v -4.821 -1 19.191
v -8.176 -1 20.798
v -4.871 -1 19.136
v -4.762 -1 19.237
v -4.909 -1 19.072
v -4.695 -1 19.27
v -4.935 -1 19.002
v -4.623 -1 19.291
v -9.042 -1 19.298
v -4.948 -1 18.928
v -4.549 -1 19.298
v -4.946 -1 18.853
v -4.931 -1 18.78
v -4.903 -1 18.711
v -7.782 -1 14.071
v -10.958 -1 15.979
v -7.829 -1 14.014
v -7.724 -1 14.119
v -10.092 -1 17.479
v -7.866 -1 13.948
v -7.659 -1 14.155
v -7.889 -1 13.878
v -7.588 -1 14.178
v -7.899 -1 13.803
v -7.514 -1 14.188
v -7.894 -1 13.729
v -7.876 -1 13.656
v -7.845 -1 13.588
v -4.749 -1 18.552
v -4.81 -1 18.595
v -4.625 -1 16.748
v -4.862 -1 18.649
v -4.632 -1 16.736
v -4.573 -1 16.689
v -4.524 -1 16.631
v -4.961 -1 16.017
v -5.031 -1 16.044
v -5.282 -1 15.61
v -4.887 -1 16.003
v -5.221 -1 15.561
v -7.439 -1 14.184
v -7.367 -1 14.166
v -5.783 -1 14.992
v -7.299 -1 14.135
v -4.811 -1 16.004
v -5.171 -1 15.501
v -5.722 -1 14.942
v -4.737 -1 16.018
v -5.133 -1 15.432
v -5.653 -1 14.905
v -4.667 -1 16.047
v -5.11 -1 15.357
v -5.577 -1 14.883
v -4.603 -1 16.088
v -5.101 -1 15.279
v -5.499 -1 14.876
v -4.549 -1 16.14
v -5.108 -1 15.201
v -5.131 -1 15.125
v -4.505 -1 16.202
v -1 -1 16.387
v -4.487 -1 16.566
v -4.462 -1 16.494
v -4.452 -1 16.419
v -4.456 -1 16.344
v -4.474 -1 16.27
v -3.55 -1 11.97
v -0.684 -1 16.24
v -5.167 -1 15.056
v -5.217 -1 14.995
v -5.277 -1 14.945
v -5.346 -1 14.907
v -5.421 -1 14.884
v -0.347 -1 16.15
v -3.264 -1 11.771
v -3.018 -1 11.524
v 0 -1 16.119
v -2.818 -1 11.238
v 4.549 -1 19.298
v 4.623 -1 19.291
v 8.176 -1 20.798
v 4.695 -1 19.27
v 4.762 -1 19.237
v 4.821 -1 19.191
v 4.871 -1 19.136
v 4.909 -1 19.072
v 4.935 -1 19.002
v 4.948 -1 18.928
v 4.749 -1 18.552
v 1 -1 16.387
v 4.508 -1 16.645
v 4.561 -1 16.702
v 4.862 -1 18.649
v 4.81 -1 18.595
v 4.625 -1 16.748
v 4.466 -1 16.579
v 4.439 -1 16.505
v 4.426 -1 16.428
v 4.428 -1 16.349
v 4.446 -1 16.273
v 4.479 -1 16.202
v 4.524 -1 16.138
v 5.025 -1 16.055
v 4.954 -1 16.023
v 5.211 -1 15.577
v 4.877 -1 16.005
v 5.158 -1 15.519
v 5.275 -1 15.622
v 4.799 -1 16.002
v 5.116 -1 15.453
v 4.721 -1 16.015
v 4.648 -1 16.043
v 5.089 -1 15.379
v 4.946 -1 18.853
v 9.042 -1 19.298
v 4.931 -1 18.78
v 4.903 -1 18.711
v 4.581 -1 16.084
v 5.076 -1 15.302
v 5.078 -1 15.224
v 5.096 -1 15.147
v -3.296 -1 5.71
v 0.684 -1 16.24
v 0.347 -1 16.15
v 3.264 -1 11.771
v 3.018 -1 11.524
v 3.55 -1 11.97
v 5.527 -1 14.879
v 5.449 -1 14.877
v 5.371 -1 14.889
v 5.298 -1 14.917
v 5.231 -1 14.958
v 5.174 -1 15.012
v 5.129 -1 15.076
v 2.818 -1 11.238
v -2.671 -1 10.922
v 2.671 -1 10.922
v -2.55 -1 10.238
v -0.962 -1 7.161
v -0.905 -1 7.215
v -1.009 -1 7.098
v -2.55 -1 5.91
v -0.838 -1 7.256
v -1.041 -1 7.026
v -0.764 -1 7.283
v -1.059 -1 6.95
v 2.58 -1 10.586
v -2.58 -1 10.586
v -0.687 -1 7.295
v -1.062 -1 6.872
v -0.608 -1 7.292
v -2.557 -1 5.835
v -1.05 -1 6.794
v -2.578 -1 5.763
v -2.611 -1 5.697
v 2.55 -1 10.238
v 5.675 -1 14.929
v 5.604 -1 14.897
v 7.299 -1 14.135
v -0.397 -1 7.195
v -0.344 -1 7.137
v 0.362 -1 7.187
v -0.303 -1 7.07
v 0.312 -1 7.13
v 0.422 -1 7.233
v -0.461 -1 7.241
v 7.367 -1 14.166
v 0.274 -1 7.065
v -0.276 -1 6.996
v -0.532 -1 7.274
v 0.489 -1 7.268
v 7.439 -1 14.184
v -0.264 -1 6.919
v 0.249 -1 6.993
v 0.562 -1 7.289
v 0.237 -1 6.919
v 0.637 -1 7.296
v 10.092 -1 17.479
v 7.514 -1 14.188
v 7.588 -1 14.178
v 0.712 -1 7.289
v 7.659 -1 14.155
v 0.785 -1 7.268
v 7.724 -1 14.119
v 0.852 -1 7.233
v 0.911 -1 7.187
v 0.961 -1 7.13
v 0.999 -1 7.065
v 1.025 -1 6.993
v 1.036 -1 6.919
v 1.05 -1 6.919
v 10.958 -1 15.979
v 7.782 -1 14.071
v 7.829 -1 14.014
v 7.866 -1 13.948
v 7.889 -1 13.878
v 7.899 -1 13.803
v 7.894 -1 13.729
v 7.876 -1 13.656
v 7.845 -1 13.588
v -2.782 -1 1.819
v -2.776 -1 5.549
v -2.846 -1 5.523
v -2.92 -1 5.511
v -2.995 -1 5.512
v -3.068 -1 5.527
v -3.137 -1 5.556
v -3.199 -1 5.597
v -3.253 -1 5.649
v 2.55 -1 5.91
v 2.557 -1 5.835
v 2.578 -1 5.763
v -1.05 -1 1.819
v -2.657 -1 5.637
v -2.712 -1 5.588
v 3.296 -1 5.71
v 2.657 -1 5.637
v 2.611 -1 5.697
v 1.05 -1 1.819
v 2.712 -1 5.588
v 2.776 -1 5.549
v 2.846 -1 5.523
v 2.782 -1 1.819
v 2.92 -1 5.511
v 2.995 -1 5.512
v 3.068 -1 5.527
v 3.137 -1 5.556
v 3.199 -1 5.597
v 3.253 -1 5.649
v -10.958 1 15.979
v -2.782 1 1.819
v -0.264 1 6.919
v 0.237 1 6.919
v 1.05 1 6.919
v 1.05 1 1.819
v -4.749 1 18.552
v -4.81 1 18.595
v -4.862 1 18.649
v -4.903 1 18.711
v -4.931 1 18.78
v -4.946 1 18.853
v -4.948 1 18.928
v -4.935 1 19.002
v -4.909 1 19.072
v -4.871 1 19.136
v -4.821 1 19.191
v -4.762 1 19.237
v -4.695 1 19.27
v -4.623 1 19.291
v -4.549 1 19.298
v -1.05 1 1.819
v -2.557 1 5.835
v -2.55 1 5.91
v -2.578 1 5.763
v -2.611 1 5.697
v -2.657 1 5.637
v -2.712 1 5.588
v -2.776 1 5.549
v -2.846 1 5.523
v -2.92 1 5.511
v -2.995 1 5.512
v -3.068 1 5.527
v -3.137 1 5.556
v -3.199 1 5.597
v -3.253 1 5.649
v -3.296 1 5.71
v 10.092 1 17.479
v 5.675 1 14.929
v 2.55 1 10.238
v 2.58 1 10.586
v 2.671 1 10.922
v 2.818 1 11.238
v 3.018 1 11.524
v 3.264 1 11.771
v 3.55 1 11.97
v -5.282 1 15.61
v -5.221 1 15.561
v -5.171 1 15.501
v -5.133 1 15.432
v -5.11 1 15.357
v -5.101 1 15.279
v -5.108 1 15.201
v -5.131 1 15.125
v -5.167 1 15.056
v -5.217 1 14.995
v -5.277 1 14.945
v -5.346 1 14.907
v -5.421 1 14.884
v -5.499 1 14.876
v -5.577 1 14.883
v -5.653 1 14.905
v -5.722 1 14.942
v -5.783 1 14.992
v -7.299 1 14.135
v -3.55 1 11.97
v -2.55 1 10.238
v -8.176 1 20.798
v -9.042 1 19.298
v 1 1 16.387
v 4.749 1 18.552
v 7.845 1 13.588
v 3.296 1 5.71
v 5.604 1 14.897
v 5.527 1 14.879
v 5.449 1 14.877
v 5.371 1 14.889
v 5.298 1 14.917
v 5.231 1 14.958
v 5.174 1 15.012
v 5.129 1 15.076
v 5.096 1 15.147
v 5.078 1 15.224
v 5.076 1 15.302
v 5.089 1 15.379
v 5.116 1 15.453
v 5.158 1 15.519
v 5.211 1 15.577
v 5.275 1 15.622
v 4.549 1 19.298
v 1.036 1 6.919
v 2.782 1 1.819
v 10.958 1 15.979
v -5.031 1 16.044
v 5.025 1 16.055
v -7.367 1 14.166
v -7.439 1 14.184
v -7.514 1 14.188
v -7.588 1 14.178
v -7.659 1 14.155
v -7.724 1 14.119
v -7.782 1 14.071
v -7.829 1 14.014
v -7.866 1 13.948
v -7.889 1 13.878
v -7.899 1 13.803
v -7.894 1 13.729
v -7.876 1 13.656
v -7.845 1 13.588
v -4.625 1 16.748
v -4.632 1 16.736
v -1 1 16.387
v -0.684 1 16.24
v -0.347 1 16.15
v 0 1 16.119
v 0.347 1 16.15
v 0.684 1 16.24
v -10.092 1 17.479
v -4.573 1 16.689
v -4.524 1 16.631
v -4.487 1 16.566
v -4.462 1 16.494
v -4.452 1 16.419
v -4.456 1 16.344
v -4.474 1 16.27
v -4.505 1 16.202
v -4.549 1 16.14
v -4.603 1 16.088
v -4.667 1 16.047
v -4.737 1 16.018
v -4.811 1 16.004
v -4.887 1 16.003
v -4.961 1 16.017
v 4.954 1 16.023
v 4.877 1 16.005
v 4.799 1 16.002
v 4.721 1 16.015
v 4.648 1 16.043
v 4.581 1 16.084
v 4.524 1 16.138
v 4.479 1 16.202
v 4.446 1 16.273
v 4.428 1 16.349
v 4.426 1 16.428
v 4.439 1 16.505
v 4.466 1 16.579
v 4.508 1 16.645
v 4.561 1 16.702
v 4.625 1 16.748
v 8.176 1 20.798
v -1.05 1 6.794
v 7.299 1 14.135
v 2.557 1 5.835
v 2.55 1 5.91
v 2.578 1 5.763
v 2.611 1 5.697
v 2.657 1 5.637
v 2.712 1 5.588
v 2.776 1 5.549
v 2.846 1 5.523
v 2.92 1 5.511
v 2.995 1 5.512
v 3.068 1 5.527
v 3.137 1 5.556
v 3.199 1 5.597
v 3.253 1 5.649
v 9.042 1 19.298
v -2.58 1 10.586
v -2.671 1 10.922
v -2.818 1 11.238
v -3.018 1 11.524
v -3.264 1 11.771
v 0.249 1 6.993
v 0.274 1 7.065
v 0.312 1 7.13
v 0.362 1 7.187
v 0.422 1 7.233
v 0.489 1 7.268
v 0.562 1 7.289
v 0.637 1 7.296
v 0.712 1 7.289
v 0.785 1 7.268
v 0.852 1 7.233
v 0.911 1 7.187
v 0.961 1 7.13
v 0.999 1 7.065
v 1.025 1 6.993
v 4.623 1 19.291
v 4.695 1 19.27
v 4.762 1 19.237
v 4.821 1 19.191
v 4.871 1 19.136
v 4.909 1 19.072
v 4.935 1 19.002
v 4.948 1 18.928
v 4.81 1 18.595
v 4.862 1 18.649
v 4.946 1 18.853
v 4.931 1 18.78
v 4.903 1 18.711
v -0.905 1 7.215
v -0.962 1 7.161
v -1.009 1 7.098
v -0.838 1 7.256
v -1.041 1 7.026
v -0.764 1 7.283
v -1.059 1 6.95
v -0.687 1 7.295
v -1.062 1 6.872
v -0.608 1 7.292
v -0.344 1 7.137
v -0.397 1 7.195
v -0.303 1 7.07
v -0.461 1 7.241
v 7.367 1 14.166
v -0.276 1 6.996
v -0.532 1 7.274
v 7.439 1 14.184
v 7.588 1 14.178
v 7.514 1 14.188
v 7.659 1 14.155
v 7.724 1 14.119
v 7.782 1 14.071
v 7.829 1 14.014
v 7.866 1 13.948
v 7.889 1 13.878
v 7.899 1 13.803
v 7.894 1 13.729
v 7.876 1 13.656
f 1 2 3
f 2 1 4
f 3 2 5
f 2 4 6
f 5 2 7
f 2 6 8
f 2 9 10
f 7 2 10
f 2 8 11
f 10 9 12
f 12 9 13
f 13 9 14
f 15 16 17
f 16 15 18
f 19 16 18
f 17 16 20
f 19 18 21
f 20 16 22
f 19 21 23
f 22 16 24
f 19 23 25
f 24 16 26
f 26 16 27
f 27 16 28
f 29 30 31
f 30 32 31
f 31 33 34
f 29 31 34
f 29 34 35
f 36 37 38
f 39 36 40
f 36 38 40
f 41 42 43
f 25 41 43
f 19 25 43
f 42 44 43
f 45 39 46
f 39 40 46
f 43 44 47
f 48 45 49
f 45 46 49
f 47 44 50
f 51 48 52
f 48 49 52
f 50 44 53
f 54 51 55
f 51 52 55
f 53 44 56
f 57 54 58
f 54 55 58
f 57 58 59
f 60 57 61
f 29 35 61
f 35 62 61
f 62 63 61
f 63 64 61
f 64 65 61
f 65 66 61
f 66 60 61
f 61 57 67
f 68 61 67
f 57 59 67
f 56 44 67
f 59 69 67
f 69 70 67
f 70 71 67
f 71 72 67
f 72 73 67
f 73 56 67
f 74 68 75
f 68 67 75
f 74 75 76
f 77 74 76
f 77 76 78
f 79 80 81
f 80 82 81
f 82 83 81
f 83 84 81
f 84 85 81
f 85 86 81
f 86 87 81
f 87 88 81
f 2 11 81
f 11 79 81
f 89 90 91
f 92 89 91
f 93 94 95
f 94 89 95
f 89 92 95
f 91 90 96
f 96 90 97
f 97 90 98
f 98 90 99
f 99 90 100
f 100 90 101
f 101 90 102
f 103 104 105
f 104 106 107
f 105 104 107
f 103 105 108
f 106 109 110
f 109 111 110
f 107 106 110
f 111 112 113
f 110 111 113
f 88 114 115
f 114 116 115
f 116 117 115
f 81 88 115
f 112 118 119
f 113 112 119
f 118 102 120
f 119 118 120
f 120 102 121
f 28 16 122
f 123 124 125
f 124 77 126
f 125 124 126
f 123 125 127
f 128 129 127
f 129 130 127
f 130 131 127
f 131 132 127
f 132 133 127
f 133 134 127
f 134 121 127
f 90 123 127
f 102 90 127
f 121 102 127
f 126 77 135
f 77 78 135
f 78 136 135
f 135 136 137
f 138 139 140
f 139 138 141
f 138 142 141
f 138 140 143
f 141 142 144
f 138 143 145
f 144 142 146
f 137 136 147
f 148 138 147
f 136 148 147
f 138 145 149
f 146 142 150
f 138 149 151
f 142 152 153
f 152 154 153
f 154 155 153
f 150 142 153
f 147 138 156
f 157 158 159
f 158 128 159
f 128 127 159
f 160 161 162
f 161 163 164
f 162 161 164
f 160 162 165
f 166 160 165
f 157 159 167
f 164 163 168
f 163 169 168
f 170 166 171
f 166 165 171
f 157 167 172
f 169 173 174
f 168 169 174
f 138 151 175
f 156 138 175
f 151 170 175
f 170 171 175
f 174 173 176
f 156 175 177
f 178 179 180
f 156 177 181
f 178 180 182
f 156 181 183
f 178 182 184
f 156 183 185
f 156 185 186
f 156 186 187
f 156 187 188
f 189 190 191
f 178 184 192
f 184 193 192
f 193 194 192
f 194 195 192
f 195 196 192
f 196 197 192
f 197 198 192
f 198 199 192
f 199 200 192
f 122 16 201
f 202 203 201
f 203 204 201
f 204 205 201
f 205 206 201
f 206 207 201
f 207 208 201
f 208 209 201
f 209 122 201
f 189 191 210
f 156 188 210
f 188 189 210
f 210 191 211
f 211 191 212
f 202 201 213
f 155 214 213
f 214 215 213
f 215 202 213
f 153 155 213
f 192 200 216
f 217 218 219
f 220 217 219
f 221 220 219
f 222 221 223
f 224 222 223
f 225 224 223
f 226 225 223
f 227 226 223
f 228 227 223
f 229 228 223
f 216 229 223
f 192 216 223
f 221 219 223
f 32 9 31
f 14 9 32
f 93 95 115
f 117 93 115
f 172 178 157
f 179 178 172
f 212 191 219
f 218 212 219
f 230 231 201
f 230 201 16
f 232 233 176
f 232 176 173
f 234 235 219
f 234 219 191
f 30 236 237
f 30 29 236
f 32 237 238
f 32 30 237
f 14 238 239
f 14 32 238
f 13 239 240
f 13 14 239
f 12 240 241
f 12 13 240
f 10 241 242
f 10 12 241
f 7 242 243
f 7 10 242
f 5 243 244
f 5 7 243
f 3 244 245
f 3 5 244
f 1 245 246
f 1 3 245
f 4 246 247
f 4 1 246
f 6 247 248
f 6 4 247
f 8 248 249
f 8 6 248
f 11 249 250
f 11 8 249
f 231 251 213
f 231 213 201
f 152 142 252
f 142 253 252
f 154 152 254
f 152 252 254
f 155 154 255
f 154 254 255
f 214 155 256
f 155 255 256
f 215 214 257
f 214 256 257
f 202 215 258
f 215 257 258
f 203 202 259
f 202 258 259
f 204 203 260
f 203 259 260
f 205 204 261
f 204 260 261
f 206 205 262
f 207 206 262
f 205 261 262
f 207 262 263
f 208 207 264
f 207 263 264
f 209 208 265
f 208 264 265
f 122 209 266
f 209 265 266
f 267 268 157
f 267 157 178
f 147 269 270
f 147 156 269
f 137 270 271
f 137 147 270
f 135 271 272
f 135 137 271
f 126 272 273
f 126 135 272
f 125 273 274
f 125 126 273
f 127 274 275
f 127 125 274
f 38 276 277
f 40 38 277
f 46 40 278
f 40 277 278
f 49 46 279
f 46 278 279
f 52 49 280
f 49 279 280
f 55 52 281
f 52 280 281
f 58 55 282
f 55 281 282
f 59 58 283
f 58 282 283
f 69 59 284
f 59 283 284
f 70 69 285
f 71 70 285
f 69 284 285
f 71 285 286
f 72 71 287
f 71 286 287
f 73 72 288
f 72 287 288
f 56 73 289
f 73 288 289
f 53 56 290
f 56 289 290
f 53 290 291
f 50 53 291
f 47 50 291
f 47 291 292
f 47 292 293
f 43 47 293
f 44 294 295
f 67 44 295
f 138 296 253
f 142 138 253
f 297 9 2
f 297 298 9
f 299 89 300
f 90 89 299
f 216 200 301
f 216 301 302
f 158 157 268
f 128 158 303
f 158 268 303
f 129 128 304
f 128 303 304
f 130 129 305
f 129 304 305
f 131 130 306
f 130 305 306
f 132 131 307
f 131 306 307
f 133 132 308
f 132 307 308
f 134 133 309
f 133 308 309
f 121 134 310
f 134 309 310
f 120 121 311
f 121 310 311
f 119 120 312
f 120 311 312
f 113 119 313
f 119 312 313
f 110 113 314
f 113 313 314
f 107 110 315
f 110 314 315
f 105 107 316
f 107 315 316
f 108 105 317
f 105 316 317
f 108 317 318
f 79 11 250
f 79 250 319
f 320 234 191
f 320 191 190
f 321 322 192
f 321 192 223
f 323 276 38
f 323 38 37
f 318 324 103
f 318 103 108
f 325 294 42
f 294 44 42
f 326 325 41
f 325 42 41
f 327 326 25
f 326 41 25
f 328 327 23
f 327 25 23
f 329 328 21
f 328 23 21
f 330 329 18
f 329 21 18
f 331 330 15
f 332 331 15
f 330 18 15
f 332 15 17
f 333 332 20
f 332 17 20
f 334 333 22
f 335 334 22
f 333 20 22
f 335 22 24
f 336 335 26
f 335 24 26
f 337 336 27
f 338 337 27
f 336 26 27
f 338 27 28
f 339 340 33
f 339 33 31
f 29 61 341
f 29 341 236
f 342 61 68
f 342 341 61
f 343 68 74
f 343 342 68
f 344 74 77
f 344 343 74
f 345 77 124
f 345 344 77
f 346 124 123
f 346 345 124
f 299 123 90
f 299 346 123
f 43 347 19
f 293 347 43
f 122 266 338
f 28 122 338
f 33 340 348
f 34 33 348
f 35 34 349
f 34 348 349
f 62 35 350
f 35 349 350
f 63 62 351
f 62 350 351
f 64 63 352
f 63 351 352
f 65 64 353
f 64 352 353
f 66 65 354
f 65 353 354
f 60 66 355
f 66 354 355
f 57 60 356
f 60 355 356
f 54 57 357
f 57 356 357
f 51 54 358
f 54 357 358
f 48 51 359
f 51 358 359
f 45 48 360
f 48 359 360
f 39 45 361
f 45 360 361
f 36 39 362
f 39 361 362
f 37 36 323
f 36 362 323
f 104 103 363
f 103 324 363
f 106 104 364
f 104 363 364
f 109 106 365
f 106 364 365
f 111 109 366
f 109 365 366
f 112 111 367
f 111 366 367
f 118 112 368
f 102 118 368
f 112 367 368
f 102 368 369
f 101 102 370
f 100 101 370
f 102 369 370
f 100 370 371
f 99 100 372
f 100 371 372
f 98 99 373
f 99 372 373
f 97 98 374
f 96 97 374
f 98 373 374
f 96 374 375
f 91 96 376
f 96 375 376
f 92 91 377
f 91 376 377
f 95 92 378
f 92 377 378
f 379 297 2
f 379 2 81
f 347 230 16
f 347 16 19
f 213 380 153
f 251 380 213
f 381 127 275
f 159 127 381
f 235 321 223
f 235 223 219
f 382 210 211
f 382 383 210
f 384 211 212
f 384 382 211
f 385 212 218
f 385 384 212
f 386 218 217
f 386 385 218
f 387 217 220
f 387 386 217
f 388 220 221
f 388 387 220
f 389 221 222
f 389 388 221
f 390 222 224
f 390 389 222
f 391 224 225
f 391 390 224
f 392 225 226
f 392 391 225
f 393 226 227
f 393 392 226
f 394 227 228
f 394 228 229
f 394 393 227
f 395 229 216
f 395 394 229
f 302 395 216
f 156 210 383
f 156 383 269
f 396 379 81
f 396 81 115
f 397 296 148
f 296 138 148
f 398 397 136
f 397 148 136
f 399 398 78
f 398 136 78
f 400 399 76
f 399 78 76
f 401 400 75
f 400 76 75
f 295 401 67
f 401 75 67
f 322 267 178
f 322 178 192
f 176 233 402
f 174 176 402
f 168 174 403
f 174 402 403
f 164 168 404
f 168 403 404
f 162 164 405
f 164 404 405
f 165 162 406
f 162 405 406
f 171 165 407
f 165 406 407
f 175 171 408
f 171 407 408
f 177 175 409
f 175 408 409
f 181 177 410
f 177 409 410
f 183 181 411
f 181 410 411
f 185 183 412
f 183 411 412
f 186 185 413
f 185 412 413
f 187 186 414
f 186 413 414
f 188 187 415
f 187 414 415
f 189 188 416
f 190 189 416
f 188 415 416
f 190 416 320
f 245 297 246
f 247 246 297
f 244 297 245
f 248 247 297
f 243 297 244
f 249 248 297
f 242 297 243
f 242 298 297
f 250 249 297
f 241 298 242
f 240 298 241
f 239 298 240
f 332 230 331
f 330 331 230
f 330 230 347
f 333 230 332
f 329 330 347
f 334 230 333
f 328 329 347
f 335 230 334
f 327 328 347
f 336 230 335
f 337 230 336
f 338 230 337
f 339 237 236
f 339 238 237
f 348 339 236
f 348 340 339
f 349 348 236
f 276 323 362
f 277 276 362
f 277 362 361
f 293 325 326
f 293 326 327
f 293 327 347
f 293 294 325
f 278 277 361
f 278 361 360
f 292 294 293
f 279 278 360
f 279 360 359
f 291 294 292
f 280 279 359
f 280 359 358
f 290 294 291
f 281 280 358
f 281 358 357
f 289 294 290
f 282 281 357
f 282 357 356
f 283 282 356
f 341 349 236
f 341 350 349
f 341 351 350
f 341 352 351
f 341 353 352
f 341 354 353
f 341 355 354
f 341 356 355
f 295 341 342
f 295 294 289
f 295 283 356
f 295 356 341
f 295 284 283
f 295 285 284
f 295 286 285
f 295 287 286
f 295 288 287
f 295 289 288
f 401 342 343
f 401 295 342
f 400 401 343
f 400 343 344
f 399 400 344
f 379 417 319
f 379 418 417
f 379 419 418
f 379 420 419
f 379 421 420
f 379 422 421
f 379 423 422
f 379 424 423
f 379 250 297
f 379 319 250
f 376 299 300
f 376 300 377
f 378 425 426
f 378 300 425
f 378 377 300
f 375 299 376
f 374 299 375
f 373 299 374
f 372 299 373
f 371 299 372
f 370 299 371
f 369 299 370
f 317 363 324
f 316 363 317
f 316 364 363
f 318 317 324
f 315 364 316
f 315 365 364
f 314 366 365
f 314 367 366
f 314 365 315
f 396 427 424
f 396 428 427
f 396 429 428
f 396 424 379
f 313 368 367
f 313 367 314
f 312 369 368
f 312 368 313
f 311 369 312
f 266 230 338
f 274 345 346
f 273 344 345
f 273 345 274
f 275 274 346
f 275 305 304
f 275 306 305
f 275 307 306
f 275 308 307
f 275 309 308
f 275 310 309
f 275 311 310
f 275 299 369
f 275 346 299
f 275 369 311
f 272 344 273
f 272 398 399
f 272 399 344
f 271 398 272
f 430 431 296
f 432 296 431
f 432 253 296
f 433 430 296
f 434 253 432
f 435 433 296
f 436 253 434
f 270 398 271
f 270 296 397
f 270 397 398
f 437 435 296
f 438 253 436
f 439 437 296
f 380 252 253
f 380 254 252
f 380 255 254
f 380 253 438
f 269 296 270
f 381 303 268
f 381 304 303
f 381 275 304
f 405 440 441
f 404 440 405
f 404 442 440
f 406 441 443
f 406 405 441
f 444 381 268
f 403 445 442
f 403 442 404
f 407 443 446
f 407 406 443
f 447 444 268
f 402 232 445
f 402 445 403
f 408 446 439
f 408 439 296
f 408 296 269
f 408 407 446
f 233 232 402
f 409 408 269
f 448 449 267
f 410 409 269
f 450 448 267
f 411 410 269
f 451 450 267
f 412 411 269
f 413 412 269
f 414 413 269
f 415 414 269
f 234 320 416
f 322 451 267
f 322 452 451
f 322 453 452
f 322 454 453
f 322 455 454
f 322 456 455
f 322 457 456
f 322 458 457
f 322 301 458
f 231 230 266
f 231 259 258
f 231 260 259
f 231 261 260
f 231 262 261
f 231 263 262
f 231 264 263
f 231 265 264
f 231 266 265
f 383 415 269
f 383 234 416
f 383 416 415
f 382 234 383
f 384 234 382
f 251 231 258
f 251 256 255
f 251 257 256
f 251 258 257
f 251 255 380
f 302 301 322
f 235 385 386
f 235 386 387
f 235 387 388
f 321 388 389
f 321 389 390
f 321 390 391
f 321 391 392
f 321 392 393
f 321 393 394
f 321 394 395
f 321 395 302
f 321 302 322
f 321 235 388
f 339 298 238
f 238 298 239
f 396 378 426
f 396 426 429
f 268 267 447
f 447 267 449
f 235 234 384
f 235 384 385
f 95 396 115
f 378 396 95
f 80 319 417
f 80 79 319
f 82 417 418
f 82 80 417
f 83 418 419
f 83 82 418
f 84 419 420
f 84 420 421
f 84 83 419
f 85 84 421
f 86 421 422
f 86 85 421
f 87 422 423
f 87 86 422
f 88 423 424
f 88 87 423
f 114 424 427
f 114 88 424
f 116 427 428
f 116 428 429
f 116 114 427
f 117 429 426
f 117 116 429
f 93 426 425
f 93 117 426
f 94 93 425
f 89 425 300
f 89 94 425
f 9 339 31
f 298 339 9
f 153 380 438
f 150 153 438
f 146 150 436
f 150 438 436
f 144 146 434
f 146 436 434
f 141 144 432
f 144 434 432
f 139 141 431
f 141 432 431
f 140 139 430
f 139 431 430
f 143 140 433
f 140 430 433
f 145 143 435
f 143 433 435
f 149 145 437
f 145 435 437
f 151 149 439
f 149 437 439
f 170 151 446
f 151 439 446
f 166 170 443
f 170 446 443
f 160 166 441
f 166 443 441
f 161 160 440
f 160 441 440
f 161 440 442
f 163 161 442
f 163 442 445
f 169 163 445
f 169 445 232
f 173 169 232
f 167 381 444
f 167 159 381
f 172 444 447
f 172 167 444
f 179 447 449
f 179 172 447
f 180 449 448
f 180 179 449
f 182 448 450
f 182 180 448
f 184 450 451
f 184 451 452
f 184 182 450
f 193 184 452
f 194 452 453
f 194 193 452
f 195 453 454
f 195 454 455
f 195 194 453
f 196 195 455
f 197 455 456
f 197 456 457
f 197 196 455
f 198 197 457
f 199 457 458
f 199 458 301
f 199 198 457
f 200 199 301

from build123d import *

# Parameters (mm, degrees)
EXTRUDE_1_DEPTH          = 1
CUT_EXTRUDE_1_DEPTH      = 5
SKETCH_4_R               = 0.4
CUT_EXTRUDE_2_DEPTH      = 5
PATTERN_CIRCULAR_3_COUNT = 3
FILLET_1_R               = 0.4
FILLET_2_R               = 2


with BuildPart() as part:
    # 草图1 → 凸台-拉伸1 (new, symmetric)
    with BuildSketch(Plane(origin=(0, 0, 0), x_dir=(1, 0, 0), z_dir=(0, 1, 0))):
        Polygon((9.041729559, -19.298041681), (-9.041729559, -19.298041681), (-8.175704156, -20.798041681), (8.175704156, -20.798041681), align=None)
        Polygon((2.782050808, -1.818653348), (1.05, -1.818653348), (10.091729559, -17.479388333), (10.957754963, -15.979388333), align=None)
        Polygon((-10.091729559, -17.479388333), (-1.05, -1.818653348), (-2.782050808, -1.818653348), (-10.957754963, -15.979388333), align=None)
        Polygon((-1.05, -6.918653348), (-1.05, -1.818653348), (-10.091729559, -17.479388333), (-5.675, -14.929388333), (-4.625, -16.748041681), (-9.041729559, -19.298041681), (9.041729559, -19.298041681), (4.625, -16.748041681), (5.675, -14.929388333), (10.091729559, -17.479388333), (1.05, -1.818653348), (1.05, -6.918653348), align=None)
    extrude(amount=EXTRUDE_1_DEPTH, both=True)

    # 草图2 → 切除-拉伸1 (cut, symmetric)
    with BuildSketch(Plane(origin=(0, 1, 0), x_dir=(1, 0, 0), z_dir=(0, 1, 0))):
        Polygon((8.591729559, -14.881312122), (2.55, -4.416729559), (2.55, -11.393117934), align=None)
        Polygon((6.041729559, -19.298041681), (0, -15.809847493), (-6.041729559, -19.298041681), align=None)
        Polygon((-2.55, -11.393117934), (-2.55, -4.416729559), (-8.591729559, -14.881312122), align=None)
    extrude(amount=CUT_EXTRUDE_1_DEPTH, both=True, mode=Mode.SUBTRACT)

    # 草图4 → 切除-拉伸2 (cut, symmetric)
    with BuildSketch(Plane(origin=(0, 1, 0), x_dir=(1, 0, 0), z_dir=(0, 1, 0))):
        with Locations((5.475, -15.275798494)):
            Circle(SKETCH_4_R)
        with Locations((4.825, -16.401631519)):
            Circle(SKETCH_4_R)
    cut_extrude_2 = extrude(amount=CUT_EXTRUDE_2_DEPTH, both=True, mode=Mode.SUBTRACT)

    # 阵列(圆周)3: 切除-拉伸2 ×3 about axis
    pattern_circular_3_axis = Axis((-0.013172797, 0, 12.857755803), (0, 1, 0))
    for i in range(1, PATTERN_CIRCULAR_3_COUNT):
        add(cut_extrude_2.rotate(pattern_circular_3_axis, i * 360 / PATTERN_CIRCULAR_3_COUNT), mode=Mode.SUBTRACT)

    # 圆角1
    fillet_1_edges = [part.edges().sort_by_distance(p)[0] for p in [
        (-2.55, 0, 4.416729559),
        (-8.591729559, 0, 14.881312122),
        (-6.041729559, 0, 19.298041681),
        (6.041729559, 0, 19.298041681),
        (8.591729559, 0, 14.881312122),
        (2.55, 0, 4.416729559),
    ]]
    fillet(fillet_1_edges, radius=FILLET_1_R)

    # 圆角2
    fillet_2_edges = [part.edges().sort_by_distance(p)[0] for p in [
        (-2.55, 0, 11.393117934),
        (0, 0, 15.809847493),
        (2.55, 0, 11.393117934),
    ]]
    fillet(fillet_2_edges, radius=FILLET_2_R)


solid = part.part
